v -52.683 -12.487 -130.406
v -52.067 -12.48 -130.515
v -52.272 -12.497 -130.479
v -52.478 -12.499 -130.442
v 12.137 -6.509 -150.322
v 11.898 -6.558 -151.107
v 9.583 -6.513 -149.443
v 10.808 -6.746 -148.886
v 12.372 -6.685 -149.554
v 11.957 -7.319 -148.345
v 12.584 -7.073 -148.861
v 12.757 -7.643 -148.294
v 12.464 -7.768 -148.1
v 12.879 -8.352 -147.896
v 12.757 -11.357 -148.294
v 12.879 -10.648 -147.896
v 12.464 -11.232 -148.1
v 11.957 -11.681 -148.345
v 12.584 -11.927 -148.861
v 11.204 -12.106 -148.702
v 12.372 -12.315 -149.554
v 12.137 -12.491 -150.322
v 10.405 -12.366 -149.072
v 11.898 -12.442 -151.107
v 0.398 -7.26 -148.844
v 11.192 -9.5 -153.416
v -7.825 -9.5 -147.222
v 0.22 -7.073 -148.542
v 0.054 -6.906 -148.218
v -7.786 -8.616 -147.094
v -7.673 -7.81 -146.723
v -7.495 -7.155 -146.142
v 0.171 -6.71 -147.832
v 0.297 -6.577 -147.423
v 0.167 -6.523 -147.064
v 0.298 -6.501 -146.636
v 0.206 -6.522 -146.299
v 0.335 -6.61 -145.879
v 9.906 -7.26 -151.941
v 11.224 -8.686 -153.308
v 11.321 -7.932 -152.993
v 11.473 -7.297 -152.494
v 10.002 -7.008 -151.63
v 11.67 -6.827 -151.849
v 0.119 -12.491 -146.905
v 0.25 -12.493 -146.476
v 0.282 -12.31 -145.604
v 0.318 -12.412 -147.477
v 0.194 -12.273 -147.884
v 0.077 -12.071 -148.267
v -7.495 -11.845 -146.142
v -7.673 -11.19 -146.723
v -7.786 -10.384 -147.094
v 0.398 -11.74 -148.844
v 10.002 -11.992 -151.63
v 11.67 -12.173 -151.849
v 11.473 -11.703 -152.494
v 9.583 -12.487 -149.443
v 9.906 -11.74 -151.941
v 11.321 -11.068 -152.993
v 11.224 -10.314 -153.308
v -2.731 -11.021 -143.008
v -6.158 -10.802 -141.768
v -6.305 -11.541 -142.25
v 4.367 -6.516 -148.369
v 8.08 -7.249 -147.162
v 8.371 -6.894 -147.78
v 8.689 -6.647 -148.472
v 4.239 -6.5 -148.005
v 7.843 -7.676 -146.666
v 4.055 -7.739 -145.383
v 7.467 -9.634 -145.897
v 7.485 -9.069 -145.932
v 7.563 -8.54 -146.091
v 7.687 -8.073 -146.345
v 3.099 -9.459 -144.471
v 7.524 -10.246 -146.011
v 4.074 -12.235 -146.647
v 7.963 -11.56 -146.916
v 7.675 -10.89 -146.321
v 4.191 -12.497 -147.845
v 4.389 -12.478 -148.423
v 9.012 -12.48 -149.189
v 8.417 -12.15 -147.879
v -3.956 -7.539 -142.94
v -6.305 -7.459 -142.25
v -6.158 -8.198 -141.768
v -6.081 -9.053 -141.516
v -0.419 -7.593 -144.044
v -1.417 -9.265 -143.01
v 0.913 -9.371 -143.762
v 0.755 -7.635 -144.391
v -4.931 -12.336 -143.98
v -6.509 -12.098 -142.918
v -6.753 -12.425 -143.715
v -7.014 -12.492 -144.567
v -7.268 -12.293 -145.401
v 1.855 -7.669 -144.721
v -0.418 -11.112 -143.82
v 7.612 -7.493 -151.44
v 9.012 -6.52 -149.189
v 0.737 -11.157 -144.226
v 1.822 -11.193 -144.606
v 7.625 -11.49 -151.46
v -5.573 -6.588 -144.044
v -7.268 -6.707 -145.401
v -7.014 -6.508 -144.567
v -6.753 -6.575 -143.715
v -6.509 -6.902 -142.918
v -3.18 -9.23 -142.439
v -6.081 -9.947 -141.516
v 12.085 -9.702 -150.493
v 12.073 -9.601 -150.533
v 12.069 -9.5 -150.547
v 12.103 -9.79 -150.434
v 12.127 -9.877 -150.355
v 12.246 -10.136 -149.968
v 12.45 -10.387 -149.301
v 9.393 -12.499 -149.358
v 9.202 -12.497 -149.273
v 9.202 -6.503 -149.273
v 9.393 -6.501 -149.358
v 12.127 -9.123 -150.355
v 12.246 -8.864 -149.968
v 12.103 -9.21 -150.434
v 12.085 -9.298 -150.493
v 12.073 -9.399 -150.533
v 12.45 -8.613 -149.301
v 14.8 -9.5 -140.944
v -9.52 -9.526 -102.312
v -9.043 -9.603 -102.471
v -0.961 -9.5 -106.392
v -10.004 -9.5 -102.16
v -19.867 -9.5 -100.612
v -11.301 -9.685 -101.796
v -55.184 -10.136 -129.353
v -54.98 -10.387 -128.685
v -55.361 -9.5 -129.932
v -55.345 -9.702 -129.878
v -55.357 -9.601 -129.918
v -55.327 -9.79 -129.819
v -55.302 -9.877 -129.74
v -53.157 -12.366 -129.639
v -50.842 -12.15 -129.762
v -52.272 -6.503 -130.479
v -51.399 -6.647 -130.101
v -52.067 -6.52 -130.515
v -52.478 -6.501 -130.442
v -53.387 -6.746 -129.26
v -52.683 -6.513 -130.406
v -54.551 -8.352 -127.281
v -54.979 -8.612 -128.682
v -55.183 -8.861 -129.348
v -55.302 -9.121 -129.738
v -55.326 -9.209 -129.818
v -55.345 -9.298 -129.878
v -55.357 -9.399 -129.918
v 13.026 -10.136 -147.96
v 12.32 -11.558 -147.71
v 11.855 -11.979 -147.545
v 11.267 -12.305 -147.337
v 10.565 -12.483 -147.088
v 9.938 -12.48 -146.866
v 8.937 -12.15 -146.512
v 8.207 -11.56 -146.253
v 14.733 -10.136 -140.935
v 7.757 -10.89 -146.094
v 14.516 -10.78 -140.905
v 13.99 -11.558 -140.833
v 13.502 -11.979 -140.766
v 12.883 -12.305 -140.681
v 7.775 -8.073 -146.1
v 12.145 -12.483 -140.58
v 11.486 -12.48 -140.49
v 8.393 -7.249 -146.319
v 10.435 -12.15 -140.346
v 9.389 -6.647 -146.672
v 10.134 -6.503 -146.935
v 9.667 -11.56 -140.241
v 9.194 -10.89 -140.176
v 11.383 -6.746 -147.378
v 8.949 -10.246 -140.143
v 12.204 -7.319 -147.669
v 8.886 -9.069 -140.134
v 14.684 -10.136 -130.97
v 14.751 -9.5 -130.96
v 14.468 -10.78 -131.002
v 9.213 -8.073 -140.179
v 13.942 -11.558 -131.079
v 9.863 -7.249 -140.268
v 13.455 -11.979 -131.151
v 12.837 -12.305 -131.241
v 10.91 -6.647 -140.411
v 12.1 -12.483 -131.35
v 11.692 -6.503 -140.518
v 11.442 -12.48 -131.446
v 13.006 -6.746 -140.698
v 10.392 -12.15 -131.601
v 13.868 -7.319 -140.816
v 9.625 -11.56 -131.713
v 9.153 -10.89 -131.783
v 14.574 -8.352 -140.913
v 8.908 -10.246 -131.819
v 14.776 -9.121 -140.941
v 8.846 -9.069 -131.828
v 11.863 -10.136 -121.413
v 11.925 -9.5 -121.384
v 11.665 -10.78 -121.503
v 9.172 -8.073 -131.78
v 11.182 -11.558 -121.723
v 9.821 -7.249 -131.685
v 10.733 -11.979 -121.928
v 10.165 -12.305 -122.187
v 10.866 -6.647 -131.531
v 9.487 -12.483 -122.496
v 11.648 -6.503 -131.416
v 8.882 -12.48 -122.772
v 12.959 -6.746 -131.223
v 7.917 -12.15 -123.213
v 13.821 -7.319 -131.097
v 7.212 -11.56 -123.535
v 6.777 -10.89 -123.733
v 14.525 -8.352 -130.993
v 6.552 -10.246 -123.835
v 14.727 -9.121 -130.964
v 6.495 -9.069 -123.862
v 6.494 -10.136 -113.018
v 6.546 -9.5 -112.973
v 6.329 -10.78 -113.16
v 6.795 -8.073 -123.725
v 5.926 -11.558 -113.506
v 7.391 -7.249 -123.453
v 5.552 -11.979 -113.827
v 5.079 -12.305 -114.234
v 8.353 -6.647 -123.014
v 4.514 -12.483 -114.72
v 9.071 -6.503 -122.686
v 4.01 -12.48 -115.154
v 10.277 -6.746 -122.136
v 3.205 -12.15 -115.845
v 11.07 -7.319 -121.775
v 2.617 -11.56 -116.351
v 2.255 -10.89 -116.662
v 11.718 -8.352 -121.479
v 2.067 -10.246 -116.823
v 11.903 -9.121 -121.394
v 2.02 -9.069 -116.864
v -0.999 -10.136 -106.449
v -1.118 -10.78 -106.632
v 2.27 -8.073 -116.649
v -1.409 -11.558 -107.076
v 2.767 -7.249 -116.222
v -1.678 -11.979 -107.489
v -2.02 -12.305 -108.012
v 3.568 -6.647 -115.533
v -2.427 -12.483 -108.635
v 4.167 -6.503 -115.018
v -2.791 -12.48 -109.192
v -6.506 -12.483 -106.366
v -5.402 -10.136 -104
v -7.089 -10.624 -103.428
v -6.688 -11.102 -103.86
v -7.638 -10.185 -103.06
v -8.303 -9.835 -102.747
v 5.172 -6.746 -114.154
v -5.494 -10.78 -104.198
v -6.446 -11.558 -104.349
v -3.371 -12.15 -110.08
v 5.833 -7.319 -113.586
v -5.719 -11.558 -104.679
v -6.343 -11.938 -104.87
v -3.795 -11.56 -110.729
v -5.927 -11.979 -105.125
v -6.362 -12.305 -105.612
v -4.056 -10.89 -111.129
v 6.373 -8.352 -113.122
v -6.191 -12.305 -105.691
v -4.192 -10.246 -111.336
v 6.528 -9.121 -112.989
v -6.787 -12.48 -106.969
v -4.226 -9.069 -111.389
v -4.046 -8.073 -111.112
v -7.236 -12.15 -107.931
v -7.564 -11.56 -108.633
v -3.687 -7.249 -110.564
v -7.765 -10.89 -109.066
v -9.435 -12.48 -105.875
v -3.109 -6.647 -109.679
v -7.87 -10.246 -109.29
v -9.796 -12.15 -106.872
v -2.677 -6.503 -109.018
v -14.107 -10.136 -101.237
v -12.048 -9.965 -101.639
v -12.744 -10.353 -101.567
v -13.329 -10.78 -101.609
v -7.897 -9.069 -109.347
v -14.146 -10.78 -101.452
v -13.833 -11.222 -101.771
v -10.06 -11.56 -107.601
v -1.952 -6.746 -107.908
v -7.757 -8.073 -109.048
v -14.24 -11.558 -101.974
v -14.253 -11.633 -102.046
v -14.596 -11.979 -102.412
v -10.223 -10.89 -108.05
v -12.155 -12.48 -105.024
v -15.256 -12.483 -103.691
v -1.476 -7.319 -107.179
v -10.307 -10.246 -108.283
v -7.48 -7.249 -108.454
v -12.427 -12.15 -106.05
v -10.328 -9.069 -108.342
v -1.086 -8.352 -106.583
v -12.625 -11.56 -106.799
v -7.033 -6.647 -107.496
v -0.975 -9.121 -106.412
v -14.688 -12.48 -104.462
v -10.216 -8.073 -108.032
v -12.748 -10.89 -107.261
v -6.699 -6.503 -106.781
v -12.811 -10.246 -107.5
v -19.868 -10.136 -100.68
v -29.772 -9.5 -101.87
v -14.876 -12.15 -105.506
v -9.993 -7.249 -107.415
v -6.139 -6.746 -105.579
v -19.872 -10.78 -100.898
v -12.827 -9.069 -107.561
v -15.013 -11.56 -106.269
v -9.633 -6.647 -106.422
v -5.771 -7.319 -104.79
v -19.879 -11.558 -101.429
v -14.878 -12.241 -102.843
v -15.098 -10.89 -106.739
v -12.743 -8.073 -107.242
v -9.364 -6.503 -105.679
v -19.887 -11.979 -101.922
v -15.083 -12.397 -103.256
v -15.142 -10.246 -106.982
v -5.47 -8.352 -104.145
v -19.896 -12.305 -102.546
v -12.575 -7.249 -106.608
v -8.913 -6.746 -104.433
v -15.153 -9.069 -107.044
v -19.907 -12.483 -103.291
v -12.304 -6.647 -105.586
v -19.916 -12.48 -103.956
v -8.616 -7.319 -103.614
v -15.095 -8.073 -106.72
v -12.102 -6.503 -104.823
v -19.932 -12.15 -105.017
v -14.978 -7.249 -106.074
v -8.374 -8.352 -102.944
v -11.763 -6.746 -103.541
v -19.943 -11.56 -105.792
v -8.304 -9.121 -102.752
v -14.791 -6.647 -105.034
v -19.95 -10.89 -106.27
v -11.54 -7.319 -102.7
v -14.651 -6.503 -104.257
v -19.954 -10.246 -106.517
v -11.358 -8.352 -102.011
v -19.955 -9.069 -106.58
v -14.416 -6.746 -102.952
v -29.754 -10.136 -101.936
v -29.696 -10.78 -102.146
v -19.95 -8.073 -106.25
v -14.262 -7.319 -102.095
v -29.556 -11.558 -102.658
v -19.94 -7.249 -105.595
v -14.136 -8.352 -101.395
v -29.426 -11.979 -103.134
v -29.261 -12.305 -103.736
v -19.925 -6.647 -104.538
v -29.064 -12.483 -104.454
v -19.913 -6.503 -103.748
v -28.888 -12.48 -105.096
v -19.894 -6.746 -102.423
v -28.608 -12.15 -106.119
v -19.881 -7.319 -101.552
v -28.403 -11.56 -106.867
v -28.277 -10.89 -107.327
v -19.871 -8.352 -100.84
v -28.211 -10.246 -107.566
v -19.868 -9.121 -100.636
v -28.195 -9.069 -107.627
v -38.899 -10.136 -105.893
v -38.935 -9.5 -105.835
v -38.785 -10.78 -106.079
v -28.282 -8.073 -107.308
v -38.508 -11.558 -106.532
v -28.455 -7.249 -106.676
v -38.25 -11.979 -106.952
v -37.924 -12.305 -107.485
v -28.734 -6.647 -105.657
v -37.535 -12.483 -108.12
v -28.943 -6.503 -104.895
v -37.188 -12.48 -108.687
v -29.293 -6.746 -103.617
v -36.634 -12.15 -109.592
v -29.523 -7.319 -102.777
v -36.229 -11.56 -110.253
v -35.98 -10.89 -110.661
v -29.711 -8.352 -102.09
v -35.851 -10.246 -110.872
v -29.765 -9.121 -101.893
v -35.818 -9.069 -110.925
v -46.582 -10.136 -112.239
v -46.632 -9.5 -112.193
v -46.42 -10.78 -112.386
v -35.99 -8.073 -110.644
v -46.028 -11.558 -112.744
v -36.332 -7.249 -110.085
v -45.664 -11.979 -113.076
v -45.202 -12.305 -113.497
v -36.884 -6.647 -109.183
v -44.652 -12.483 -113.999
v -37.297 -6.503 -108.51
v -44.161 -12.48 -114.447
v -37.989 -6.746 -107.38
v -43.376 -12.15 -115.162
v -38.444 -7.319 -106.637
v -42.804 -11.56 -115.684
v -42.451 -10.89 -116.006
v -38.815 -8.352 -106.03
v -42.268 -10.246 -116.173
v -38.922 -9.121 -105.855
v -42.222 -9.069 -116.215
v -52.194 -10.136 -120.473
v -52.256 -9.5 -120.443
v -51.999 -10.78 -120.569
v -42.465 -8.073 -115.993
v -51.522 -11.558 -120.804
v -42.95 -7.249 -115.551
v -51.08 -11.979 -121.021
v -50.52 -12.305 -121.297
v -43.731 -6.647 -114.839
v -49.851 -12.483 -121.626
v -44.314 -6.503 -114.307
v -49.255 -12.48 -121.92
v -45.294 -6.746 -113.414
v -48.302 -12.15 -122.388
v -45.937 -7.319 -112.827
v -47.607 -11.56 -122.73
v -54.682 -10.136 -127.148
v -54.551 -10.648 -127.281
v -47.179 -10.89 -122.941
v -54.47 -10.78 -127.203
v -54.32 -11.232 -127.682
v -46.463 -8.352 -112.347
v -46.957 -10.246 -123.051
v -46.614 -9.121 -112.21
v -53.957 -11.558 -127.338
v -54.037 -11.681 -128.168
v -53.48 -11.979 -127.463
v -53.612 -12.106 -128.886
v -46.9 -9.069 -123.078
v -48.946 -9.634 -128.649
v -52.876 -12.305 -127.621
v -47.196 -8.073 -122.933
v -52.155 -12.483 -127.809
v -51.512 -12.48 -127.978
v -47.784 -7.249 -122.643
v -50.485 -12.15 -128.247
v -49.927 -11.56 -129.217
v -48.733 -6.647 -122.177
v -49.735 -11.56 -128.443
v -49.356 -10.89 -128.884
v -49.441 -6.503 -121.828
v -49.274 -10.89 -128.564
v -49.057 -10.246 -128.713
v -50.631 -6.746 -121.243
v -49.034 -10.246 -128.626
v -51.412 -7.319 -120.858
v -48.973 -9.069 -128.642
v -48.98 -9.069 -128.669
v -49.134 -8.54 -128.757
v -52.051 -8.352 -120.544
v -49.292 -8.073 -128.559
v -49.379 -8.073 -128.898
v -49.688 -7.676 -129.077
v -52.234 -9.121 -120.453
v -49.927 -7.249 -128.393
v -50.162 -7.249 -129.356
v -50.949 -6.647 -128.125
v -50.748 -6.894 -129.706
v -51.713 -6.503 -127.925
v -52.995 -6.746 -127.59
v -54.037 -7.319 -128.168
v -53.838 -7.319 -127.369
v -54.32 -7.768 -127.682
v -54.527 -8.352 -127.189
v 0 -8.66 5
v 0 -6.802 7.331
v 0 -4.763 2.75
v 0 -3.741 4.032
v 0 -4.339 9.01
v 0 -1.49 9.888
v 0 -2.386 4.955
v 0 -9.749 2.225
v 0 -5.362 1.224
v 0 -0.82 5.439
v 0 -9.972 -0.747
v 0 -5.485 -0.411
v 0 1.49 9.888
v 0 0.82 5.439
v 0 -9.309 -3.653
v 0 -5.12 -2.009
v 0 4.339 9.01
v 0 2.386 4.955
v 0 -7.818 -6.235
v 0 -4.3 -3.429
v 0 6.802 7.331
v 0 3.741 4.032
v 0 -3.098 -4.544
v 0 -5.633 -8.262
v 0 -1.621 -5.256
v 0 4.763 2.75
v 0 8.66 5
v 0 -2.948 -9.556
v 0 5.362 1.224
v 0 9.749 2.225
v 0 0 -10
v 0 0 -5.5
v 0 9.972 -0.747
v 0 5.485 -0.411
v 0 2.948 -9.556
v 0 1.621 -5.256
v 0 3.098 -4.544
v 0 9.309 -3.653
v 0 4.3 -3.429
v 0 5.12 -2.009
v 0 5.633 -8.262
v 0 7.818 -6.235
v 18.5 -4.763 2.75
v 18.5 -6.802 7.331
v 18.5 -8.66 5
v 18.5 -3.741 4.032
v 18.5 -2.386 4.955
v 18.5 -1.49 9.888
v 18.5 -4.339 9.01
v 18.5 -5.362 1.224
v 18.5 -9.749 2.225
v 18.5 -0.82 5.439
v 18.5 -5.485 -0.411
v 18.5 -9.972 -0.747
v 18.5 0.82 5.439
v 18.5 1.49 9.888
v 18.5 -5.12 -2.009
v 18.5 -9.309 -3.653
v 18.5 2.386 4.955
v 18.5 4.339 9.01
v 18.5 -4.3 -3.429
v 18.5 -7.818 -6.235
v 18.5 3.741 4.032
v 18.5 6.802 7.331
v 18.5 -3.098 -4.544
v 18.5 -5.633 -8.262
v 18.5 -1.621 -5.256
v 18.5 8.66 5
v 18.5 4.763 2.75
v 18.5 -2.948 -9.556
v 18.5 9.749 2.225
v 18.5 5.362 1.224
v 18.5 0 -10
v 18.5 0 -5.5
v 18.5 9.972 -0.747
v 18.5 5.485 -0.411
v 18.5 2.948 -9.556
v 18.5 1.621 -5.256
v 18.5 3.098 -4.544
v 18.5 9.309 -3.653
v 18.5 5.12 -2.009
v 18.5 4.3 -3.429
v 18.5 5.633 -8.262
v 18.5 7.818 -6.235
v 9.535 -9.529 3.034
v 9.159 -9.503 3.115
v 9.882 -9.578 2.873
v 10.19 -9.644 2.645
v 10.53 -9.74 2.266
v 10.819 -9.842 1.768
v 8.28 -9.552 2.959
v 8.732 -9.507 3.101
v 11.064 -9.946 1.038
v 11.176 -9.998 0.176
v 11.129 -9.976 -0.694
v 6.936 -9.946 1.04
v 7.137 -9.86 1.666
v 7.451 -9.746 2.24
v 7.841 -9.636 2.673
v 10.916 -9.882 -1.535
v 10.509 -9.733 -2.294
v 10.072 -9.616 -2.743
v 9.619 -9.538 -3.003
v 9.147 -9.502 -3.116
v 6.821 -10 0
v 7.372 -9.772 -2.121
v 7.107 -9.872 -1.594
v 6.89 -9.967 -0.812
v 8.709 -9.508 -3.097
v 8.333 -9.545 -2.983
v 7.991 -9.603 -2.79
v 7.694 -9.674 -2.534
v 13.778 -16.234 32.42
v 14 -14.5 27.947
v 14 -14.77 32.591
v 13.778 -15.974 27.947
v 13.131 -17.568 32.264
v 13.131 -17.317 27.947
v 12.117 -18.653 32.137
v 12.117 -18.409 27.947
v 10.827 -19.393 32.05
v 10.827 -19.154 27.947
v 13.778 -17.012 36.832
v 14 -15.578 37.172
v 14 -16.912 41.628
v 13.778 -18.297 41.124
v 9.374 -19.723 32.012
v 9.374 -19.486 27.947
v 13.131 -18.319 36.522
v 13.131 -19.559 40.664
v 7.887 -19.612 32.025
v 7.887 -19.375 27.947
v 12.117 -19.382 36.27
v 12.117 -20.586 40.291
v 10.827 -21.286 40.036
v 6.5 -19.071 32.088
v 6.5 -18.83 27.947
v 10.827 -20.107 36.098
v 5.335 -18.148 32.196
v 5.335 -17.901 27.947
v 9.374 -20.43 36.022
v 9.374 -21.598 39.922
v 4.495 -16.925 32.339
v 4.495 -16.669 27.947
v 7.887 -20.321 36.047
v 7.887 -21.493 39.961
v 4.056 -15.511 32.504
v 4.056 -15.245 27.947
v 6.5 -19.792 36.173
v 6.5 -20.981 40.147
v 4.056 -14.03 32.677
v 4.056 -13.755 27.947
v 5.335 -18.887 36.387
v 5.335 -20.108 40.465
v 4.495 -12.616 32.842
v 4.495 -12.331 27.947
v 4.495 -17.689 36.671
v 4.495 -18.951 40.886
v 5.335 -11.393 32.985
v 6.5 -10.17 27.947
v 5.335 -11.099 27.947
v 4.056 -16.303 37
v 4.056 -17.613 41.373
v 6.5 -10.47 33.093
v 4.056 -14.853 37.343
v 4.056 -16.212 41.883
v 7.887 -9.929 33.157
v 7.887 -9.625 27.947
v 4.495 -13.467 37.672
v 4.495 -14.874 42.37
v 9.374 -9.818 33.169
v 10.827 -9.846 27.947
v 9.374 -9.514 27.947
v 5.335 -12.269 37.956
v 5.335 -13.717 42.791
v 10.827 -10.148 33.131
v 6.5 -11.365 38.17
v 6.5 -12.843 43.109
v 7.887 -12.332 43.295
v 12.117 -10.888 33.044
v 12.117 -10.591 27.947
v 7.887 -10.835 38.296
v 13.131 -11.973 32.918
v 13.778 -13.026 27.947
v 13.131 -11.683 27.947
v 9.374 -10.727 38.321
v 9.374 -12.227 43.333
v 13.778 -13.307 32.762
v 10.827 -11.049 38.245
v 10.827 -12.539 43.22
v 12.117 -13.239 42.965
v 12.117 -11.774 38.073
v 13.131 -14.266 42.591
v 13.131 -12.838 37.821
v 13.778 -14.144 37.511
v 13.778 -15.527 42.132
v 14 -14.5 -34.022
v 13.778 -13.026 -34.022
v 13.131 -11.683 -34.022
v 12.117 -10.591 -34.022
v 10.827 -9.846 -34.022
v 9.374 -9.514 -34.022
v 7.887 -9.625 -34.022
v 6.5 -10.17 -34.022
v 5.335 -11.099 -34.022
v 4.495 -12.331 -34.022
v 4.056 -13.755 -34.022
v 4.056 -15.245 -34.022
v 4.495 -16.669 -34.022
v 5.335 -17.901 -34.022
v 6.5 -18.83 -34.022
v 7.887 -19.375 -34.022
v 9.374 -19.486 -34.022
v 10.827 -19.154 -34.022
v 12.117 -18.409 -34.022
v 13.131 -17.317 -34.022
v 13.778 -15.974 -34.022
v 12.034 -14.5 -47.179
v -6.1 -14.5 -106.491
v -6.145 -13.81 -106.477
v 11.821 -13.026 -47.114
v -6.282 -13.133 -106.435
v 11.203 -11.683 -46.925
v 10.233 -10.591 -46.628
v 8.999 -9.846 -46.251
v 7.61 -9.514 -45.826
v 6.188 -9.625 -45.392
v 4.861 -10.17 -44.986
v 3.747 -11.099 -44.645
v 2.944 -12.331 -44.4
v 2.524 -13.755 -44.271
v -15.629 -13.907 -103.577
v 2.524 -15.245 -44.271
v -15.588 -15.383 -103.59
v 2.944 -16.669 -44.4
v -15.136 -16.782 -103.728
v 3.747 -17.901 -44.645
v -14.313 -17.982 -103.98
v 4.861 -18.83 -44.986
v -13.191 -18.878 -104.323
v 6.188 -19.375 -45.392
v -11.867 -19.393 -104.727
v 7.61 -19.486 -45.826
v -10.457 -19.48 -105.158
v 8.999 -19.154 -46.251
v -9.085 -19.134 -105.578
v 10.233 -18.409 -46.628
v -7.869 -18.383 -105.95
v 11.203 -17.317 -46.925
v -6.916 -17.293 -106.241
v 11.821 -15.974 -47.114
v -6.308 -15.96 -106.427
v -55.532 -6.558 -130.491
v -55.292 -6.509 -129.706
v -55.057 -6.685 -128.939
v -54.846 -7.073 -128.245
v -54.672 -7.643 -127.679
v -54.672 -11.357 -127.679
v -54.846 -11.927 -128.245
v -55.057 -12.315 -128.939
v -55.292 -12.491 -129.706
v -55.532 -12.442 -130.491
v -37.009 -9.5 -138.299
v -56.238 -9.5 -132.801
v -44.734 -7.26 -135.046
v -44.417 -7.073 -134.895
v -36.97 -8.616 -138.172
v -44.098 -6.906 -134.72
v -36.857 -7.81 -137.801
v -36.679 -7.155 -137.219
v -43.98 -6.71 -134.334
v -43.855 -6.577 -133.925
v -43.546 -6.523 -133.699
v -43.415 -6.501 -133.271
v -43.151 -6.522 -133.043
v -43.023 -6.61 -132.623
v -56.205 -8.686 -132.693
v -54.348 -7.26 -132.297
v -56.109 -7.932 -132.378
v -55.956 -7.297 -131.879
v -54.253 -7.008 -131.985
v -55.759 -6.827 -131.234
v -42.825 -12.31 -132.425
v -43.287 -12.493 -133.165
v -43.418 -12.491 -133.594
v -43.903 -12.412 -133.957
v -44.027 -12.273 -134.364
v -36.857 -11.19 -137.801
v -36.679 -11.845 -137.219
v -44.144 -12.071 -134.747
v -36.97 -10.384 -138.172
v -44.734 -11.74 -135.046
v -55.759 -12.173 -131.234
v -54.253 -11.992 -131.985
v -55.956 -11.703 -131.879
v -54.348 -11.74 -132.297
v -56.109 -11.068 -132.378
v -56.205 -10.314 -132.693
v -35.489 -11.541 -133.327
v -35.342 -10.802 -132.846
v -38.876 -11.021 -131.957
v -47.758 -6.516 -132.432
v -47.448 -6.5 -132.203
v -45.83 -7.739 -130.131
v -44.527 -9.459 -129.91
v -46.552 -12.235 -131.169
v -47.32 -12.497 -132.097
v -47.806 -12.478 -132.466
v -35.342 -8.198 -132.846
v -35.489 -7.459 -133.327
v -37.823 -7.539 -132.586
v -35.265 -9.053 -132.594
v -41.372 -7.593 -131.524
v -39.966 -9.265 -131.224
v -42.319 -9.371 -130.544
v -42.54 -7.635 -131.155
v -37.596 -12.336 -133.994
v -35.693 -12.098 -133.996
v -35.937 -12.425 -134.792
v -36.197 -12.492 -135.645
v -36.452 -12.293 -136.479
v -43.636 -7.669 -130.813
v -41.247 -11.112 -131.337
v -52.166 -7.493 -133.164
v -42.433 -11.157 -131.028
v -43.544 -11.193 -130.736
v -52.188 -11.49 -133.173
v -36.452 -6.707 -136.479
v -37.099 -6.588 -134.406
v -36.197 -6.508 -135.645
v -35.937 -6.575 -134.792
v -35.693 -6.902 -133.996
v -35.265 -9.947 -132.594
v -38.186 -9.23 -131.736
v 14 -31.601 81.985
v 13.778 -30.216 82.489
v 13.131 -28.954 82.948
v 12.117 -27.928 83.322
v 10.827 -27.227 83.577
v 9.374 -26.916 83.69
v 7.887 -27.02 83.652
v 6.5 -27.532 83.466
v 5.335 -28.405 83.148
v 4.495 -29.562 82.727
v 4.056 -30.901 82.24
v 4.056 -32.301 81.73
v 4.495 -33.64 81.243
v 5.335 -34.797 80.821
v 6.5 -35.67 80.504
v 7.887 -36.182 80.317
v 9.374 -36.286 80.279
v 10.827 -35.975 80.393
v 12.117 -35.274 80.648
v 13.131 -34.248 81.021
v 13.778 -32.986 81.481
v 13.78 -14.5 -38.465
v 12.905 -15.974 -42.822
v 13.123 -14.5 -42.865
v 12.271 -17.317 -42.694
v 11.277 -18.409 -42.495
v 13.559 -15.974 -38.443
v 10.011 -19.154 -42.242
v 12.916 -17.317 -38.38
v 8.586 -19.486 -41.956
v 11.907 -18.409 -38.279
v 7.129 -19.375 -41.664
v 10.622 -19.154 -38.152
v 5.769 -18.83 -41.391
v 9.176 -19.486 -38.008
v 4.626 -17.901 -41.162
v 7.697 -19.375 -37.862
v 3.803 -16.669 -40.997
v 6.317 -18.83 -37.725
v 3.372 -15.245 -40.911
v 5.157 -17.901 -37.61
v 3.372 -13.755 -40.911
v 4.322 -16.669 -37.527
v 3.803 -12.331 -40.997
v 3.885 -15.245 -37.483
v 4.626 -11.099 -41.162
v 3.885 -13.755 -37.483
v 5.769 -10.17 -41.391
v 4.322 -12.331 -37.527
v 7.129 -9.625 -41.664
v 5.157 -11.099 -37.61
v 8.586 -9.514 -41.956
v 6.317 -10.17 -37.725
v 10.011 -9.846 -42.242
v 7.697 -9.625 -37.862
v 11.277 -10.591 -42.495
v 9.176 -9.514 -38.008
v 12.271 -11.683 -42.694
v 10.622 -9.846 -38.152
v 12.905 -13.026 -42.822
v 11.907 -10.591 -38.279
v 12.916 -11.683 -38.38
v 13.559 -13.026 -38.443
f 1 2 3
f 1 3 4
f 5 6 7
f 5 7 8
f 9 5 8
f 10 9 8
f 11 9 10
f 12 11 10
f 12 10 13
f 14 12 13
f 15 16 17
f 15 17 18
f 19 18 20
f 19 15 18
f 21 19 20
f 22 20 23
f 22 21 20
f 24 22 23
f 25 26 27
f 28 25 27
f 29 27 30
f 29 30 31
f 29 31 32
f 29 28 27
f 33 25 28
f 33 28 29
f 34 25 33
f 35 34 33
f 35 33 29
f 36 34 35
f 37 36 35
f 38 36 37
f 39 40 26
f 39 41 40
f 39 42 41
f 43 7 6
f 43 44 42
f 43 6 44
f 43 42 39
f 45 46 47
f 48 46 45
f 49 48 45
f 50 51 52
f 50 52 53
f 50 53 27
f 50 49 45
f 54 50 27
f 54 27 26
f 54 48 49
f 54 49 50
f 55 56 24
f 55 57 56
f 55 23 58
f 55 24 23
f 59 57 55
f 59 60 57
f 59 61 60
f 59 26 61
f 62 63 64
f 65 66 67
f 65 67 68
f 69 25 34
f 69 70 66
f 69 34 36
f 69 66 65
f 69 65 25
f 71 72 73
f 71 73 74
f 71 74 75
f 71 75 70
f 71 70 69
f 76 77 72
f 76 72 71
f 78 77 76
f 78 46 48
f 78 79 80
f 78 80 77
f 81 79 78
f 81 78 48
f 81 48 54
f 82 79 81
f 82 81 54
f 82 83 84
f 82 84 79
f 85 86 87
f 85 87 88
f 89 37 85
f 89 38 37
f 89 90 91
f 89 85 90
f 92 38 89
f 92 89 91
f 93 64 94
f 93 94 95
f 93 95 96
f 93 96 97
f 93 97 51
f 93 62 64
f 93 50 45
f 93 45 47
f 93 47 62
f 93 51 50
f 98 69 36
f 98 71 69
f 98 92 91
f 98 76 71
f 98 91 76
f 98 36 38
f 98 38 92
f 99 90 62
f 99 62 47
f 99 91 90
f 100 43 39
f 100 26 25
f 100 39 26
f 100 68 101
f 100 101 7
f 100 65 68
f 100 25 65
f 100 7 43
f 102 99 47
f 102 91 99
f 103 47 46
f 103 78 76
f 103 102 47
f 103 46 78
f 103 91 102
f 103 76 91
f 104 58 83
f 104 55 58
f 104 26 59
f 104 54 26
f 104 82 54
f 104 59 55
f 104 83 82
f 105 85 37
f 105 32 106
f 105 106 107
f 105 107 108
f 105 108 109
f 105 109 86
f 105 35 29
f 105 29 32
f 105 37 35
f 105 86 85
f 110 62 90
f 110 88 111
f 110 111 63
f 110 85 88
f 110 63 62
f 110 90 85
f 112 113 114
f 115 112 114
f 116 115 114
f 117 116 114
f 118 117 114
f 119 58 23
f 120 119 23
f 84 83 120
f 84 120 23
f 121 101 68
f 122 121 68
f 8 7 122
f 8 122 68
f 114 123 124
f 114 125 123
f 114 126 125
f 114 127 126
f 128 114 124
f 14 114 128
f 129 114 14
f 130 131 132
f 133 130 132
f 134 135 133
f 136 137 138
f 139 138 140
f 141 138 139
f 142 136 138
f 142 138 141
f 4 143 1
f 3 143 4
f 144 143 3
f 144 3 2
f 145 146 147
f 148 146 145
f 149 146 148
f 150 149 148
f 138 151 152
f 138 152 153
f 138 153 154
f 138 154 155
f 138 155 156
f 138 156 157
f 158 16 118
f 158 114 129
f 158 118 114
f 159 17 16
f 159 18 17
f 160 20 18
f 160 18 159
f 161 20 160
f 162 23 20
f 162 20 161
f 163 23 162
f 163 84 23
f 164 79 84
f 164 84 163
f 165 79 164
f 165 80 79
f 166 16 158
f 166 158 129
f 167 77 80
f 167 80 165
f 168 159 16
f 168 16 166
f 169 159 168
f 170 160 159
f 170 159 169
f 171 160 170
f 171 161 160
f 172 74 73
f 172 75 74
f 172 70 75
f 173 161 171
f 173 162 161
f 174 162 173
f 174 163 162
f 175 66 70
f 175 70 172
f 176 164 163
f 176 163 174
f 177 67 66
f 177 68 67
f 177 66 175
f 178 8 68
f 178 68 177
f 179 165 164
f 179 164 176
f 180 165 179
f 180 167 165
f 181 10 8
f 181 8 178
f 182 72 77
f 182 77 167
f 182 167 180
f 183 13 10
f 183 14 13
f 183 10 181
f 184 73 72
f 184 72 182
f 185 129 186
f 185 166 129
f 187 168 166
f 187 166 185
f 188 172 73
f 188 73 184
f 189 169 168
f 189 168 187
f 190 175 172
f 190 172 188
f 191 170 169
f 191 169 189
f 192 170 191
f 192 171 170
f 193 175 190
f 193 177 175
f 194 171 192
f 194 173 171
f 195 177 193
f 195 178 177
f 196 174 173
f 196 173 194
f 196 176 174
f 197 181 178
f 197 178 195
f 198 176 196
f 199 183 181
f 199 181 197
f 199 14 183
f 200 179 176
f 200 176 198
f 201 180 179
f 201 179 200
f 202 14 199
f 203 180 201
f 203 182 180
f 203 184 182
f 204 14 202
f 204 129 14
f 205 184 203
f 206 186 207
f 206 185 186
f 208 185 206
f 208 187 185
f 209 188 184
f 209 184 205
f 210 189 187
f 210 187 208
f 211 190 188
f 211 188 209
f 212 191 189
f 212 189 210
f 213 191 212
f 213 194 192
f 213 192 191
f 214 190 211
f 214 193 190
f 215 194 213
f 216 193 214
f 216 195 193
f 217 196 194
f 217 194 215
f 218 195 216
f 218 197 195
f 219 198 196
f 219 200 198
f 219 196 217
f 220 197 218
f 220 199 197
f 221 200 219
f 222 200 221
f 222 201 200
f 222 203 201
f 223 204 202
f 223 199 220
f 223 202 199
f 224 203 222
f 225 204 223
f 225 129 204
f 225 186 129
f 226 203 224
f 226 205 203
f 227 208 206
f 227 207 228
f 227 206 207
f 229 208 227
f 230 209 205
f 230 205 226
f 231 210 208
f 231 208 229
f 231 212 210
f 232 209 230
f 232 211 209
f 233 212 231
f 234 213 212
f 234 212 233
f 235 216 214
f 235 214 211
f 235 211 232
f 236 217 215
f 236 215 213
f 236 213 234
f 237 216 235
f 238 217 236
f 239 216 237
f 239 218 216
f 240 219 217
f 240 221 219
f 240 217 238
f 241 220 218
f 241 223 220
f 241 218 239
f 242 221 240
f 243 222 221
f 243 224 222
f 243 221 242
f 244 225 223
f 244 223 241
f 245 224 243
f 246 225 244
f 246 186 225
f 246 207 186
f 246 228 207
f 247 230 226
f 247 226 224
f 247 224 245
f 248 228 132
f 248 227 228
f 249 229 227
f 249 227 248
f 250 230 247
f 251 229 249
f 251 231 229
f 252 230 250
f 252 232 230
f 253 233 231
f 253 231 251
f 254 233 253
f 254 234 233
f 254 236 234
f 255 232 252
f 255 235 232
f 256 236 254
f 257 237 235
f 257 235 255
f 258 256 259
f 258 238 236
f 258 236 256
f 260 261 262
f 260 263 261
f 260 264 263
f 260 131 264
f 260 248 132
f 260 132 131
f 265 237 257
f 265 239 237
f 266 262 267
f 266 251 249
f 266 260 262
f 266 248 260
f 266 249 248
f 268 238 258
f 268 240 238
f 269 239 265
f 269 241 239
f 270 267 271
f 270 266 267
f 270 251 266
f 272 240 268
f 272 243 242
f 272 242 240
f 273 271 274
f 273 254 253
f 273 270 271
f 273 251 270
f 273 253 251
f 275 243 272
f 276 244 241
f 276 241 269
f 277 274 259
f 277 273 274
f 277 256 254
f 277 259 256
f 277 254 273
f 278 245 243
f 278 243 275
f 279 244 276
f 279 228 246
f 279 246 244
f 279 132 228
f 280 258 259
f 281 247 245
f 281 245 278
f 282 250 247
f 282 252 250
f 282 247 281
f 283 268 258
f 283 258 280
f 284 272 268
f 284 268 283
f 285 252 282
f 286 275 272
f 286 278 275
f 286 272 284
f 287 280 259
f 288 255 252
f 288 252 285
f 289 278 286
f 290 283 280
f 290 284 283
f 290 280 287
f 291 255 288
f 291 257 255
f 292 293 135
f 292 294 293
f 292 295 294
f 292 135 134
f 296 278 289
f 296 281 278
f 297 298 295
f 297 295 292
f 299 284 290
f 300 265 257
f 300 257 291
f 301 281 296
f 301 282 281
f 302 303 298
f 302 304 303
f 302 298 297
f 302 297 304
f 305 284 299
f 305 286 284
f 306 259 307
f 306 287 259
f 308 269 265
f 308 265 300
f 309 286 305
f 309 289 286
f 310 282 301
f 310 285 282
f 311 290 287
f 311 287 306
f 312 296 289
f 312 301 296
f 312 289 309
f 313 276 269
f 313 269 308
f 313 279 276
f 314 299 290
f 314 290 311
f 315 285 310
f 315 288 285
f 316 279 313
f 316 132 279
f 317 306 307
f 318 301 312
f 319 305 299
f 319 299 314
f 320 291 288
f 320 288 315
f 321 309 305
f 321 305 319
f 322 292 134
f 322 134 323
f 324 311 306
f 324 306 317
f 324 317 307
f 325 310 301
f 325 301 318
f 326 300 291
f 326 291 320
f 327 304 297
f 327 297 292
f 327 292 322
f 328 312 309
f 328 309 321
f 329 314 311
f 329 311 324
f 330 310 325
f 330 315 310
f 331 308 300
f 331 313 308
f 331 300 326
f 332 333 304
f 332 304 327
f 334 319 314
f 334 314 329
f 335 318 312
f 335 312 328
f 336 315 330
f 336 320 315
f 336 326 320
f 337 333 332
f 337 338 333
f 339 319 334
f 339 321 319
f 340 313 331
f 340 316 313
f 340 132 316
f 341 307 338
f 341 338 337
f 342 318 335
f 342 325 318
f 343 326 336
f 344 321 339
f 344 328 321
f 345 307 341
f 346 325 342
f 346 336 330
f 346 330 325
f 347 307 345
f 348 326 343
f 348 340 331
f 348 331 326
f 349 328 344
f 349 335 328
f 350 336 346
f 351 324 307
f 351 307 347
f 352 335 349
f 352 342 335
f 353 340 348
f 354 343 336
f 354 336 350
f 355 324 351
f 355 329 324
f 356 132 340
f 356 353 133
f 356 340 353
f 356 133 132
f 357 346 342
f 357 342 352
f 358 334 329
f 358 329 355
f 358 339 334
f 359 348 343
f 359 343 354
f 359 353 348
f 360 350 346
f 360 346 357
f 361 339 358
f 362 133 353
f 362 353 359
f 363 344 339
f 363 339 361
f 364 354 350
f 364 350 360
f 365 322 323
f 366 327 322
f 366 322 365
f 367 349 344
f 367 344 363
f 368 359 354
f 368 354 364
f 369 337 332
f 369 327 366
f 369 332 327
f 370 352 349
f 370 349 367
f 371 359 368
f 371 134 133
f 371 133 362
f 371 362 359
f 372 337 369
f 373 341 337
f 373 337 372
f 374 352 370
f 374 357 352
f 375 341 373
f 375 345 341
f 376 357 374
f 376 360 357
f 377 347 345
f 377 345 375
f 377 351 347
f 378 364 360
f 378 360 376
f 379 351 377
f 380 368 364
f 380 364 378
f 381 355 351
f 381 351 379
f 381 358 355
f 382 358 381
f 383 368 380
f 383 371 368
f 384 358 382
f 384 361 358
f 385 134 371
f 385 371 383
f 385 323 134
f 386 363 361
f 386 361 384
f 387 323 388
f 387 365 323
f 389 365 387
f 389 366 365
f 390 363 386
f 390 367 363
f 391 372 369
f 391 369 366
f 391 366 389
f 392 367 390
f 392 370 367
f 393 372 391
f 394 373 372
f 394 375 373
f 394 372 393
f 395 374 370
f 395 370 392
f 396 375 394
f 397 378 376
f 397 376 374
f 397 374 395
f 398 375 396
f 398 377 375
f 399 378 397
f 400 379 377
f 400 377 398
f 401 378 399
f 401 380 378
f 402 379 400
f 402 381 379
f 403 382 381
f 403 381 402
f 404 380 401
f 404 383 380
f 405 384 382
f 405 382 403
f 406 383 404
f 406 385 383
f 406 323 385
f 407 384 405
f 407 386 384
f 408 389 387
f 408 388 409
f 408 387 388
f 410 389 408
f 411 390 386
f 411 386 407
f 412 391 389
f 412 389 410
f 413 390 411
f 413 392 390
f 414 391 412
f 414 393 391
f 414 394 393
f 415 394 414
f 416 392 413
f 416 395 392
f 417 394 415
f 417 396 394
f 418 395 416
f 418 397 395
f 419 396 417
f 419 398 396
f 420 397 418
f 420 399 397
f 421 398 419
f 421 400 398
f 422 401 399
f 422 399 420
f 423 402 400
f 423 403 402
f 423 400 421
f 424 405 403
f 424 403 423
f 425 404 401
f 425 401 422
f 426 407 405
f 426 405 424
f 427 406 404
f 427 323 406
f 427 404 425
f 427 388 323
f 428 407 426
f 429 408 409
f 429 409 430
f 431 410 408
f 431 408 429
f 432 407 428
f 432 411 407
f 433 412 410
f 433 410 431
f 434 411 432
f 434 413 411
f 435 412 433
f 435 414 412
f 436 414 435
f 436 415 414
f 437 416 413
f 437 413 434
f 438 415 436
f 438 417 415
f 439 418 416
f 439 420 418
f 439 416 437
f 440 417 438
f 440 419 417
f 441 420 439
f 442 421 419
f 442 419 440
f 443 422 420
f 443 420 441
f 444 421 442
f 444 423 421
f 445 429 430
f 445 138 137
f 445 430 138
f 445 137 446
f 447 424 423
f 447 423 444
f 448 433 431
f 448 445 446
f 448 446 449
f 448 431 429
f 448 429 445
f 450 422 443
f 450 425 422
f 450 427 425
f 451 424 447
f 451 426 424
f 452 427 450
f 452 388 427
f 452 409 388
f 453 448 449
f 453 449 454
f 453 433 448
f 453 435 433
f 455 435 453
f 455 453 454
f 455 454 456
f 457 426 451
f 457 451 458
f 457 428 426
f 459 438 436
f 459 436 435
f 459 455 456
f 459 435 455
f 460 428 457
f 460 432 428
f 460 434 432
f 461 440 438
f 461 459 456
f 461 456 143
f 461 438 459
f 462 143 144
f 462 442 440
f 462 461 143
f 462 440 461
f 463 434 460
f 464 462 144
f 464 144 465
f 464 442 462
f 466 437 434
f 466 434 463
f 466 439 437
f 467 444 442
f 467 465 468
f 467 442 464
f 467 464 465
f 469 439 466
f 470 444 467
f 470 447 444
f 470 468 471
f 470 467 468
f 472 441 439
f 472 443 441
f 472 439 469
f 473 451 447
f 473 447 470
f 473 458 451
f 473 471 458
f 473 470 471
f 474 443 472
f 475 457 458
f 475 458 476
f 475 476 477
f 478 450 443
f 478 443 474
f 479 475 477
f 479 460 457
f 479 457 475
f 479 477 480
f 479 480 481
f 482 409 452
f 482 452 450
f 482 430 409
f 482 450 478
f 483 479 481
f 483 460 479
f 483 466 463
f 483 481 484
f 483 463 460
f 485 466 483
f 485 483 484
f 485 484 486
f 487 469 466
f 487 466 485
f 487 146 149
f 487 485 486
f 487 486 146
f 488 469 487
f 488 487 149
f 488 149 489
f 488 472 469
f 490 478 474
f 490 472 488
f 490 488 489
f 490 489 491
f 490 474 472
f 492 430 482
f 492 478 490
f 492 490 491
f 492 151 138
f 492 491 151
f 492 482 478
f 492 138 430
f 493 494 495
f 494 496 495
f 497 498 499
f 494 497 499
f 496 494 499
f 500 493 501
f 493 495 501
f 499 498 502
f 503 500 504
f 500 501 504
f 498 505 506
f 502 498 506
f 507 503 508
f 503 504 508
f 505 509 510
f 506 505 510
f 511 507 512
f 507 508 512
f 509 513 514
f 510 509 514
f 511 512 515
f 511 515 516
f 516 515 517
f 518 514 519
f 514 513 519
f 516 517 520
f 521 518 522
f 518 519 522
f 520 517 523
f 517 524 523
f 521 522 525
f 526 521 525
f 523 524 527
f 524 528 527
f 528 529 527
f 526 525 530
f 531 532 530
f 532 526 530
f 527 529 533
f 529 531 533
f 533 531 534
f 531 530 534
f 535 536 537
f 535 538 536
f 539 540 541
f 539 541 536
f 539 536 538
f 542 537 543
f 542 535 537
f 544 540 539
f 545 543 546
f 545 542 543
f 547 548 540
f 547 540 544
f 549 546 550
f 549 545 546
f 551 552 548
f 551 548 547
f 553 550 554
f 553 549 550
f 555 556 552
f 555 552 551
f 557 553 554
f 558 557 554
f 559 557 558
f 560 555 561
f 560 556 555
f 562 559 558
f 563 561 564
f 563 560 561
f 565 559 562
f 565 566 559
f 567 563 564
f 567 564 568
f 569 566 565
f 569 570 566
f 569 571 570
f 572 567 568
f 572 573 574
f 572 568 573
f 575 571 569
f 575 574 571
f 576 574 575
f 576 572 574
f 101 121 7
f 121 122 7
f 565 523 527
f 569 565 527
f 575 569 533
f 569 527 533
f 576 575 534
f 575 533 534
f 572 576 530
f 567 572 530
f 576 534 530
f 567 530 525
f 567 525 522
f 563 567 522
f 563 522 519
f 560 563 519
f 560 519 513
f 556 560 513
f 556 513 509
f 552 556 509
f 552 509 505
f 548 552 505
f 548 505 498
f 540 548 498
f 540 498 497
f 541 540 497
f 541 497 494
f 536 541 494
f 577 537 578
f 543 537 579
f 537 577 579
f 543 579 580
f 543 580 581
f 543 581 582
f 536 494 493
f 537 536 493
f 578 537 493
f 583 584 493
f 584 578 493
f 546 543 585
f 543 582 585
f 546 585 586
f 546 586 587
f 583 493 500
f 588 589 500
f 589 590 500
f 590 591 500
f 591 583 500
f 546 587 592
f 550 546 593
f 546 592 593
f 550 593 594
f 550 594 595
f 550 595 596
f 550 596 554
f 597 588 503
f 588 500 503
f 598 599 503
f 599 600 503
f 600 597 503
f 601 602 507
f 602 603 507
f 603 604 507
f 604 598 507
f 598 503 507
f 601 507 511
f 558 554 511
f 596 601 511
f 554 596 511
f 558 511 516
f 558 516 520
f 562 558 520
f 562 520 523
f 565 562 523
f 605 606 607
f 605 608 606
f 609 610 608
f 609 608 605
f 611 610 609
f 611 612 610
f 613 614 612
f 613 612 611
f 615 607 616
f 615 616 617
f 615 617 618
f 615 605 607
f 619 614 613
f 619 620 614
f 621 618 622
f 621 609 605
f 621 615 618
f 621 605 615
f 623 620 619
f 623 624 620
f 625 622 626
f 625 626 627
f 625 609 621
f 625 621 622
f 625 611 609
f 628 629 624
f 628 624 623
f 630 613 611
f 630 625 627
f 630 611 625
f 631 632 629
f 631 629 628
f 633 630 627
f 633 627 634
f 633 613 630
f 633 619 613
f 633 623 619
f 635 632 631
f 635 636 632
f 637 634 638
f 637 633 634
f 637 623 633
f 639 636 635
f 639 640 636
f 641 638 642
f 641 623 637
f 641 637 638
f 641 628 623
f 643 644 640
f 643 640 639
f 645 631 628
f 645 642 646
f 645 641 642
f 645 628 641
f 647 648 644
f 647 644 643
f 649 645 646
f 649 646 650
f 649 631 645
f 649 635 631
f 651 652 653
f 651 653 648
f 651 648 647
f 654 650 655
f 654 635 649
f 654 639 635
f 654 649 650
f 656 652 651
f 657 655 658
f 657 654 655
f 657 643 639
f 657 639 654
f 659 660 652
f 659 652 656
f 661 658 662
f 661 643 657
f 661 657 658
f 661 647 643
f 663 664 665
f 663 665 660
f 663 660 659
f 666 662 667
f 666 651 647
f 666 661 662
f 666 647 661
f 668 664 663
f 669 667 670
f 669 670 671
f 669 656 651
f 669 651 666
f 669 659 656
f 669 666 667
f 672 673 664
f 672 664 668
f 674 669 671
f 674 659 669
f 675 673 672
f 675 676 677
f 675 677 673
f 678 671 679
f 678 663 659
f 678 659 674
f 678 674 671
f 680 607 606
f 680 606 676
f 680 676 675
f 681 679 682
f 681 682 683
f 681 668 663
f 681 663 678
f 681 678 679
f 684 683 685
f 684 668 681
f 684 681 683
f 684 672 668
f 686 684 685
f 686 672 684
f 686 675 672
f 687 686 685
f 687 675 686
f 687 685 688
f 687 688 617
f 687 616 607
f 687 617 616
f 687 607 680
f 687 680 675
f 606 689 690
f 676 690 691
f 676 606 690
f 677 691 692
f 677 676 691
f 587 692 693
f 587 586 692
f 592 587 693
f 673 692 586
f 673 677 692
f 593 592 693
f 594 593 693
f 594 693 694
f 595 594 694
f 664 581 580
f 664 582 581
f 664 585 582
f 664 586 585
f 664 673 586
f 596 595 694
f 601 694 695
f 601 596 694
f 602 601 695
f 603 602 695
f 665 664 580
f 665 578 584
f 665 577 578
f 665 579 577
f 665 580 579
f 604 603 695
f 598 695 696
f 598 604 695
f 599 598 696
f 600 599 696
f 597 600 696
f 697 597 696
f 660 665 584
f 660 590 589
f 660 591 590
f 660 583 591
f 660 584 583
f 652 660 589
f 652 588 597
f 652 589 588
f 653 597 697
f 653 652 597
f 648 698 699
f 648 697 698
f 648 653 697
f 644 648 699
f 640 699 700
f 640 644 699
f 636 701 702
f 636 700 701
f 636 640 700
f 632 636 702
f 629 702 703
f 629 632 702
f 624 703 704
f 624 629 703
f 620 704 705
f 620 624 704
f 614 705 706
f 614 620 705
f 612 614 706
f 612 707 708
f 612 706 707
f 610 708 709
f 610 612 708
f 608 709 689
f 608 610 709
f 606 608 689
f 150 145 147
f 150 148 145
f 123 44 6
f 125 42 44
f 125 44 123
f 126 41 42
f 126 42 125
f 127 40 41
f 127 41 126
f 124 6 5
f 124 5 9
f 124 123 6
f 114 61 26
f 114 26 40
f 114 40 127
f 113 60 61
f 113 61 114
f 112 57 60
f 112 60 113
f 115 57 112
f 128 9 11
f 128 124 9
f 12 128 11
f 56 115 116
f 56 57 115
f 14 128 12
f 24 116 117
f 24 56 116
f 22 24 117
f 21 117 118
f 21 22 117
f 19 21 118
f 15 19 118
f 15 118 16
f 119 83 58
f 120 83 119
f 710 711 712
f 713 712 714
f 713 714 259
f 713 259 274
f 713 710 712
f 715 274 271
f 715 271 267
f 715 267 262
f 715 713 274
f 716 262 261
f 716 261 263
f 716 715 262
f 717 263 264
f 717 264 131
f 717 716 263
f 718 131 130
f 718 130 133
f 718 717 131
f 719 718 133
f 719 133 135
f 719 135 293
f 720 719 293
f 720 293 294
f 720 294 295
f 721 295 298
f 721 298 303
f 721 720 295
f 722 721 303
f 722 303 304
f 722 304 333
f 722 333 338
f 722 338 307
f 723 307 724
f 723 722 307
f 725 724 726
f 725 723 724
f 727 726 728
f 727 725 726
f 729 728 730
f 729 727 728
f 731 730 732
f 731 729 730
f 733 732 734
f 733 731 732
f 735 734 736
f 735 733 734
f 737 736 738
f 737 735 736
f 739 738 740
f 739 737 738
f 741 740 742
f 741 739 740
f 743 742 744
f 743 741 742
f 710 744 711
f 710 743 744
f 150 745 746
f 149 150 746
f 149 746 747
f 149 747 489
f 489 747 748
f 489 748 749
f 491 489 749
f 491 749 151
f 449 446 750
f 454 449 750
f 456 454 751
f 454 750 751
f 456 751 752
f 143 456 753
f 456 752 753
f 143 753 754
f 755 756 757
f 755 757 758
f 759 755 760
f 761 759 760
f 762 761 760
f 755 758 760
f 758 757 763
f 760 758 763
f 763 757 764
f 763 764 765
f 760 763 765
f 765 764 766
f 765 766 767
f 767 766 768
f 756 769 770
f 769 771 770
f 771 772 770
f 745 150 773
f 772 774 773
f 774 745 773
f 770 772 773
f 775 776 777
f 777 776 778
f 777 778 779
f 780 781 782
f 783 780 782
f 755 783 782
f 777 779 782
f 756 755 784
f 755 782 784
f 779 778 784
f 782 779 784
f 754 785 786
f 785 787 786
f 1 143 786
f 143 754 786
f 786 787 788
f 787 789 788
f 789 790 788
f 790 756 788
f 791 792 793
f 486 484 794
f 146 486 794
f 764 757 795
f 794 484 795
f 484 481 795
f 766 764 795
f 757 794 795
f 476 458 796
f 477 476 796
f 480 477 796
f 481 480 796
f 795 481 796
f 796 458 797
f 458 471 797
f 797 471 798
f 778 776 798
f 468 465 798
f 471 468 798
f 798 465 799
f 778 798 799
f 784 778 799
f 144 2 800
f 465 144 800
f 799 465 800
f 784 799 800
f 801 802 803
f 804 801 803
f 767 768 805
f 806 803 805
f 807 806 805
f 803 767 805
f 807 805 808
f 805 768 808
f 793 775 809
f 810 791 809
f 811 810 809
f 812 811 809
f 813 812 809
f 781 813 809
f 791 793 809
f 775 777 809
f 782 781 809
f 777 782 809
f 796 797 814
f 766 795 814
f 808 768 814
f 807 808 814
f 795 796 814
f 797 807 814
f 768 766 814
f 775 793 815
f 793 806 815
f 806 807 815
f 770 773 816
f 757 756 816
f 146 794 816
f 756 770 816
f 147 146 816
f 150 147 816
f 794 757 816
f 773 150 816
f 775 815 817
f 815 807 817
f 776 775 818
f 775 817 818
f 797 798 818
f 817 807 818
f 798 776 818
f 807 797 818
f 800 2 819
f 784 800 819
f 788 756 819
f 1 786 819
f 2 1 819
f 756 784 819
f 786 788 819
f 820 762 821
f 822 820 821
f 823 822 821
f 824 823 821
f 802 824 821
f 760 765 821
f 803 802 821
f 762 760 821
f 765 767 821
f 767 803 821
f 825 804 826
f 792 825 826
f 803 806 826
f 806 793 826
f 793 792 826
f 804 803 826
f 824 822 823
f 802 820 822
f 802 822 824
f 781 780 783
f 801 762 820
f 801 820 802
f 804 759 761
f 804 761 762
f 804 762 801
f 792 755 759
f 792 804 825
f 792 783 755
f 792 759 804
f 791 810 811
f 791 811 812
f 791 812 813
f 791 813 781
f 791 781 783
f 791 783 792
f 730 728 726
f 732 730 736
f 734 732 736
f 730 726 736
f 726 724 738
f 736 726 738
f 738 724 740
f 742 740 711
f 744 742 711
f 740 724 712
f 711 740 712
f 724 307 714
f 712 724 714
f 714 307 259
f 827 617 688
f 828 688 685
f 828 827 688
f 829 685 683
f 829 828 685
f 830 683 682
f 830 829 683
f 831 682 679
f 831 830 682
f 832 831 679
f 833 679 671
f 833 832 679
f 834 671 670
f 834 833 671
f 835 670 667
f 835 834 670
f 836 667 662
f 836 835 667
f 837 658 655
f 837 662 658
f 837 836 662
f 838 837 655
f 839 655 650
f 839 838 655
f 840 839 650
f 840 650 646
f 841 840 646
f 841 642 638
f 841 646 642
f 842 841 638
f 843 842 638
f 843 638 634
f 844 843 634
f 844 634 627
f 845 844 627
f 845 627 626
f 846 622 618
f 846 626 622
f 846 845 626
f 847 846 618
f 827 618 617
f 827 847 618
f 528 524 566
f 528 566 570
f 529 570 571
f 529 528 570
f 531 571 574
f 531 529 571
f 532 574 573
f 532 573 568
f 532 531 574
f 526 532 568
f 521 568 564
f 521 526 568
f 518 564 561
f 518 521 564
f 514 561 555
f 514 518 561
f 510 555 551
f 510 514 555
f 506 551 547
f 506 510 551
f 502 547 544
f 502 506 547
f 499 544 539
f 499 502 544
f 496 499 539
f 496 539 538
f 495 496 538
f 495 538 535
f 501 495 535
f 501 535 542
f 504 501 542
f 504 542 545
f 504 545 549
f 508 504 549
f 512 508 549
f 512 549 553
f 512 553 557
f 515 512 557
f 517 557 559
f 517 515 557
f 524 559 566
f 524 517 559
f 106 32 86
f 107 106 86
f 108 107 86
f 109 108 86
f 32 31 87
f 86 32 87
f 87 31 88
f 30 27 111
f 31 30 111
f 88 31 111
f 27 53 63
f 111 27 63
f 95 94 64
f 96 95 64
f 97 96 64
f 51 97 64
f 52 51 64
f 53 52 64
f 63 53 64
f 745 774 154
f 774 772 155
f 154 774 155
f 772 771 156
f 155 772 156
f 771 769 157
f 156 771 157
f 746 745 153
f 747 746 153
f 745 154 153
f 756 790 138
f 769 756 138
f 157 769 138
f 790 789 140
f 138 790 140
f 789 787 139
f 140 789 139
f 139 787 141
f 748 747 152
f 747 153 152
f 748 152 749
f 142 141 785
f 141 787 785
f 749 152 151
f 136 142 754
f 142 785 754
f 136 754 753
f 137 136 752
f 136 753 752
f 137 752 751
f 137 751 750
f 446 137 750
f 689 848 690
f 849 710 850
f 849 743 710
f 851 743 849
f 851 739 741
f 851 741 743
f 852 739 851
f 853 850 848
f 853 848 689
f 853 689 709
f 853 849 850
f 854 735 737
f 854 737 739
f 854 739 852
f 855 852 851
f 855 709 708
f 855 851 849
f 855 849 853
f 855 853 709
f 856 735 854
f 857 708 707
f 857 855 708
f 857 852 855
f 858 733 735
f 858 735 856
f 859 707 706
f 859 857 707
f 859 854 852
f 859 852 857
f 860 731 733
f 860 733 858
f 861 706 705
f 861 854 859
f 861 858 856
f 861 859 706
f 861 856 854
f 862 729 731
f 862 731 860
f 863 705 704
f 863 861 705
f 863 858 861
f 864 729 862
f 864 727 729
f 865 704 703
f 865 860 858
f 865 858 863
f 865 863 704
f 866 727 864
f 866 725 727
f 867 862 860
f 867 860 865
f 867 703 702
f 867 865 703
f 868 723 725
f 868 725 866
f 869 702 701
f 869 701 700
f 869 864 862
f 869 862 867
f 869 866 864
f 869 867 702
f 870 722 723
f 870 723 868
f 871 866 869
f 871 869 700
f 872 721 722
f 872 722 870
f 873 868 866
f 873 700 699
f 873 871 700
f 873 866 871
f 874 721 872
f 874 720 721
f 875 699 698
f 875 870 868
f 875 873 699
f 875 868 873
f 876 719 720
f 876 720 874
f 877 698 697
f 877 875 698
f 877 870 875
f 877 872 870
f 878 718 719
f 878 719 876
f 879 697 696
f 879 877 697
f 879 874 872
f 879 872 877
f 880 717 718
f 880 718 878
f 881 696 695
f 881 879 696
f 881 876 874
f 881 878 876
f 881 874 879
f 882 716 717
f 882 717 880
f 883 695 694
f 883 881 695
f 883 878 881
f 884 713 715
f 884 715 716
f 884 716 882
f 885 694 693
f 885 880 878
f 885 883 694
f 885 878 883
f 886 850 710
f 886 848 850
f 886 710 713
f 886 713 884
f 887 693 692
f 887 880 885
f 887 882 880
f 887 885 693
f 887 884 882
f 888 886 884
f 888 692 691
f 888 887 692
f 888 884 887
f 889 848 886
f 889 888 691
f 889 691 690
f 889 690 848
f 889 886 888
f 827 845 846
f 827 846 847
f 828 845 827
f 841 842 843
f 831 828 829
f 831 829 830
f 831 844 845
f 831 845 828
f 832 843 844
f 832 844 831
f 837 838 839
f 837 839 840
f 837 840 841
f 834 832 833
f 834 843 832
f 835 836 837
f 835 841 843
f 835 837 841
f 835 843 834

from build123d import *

# Parameters (mm, degrees)
SKETCH_1_R      = 10
SKETCH_1_R_2    = 5.5
EXTRUDE_1_DEPTH = 18.5
SKETCH_4_R      = 5
SKETCH_6_R      = 3
SKETCH_8_R      = 3
SKETCH_10_R     = 3


with BuildPart() as part:
    # Эскиз1 → Бобышка-Вытянуть1 (new body)
    with BuildSketch(Plane(origin=(0, 0, 0), x_dir=(0, 0, -1), z_dir=(1, 0, 0))):
        Circle(SKETCH_1_R)
        Circle(SKETCH_1_R_2, mode=Mode.SUBTRACT)
    extrude(amount=EXTRUDE_1_DEPTH)

    # По траектории1: sweep along a curve in space
    with BuildLine() as sweep_1_path:
        Line((9, -16.912295169, 41.627726505), (9, -31.601007166, 81.984631039))
        ThreePointArc((9, -14.5, 27.946920772), (9, -15.10768988, 34.892847878), (9, -16.912295169, 41.627726505))
        Line((9, -14.5, 27.946920772), (9, -14.5, -34.021959946))
        ThreePointArc((9, -14.5, -34.021959946), (8.560634534, -14.5, -39.934336391), (7.252190239, -14.5, -45.716828135))
        Line((7.252190239, -14.5, -45.716828135), (-10.881275921, -14.5, -105.028723405))
    # Эскиз4 → По траектории1 (sweep)
    with BuildSketch(Plane.XY):
        with Locations((9, -14.5)):
            Circle(SKETCH_4_R)
    sweep(path=sweep_1_path.line)

    # По траектории2: sweep along a path in Эскиз5
    with BuildLine(Plane(origin=(0, -9.5, 0), x_dir=(1, 0, 0), z_dir=(0, 1, 0))) as sweep_2_path:
        ThreePointArc((9.327108594, 149.328764781), (-10.881275921, 105.028723405), (-52.407054726, 130.45473696))
    # Эскиз6 → По траектории2 (sweep)
    with BuildSketch(Plane(origin=(-52.407054726, -9.5, -130.45473696), x_dir=(-0.984679674516163, 0, 0.17437298699839734), z_dir=(-0.17437298699839734, 0, -0.984679674516163))):
        Circle(SKETCH_6_R)
    sweep(path=sweep_2_path.line)

    # По траектории4: sweep along a path in Эскиз7
    with BuildLine(Plane(origin=(0, -9.5, 0), x_dir=(1, 0, 0), z_dir=(0, 1, 0))) as sweep_4_path:
        Line((-6.948042364, 144.352951788), (12.068642346, 150.546957166))
    # Эскиз8 → По траектории4 (sweep)
    with BuildSketch(Plane(origin=(-6.948042364, -9.5, -144.352951788), x_dir=(-0.2923717047227386, 0, -0.9563047559630349), z_dir=(0.9563047559630349, 0, -0.2923717047227386))):
        Circle(SKETCH_8_R)
    sweep(path=sweep_4_path.line)

    # По траектории5: sweep along a path in Эскиз9
    with BuildLine(Plane(origin=(0, -9.5, 0), x_dir=(1, 0, 0), z_dir=(0, 1, 0))) as sweep_5_path:
        Line((-36.131903768, 135.430549953), (-55.36109375, 129.931617999))
    # Эскиз10 → По траектории5 (sweep)
    with BuildSketch(Plane(origin=(-36.131903768, -9.5, -135.430549953), x_dir=(-0.2923717047227386, 0, -0.9563047559630349), z_dir=(0.9563047559630349, 0, -0.2923717047227386))):
        Circle(SKETCH_10_R)
    sweep(path=sweep_5_path.line)


solid = part.part
